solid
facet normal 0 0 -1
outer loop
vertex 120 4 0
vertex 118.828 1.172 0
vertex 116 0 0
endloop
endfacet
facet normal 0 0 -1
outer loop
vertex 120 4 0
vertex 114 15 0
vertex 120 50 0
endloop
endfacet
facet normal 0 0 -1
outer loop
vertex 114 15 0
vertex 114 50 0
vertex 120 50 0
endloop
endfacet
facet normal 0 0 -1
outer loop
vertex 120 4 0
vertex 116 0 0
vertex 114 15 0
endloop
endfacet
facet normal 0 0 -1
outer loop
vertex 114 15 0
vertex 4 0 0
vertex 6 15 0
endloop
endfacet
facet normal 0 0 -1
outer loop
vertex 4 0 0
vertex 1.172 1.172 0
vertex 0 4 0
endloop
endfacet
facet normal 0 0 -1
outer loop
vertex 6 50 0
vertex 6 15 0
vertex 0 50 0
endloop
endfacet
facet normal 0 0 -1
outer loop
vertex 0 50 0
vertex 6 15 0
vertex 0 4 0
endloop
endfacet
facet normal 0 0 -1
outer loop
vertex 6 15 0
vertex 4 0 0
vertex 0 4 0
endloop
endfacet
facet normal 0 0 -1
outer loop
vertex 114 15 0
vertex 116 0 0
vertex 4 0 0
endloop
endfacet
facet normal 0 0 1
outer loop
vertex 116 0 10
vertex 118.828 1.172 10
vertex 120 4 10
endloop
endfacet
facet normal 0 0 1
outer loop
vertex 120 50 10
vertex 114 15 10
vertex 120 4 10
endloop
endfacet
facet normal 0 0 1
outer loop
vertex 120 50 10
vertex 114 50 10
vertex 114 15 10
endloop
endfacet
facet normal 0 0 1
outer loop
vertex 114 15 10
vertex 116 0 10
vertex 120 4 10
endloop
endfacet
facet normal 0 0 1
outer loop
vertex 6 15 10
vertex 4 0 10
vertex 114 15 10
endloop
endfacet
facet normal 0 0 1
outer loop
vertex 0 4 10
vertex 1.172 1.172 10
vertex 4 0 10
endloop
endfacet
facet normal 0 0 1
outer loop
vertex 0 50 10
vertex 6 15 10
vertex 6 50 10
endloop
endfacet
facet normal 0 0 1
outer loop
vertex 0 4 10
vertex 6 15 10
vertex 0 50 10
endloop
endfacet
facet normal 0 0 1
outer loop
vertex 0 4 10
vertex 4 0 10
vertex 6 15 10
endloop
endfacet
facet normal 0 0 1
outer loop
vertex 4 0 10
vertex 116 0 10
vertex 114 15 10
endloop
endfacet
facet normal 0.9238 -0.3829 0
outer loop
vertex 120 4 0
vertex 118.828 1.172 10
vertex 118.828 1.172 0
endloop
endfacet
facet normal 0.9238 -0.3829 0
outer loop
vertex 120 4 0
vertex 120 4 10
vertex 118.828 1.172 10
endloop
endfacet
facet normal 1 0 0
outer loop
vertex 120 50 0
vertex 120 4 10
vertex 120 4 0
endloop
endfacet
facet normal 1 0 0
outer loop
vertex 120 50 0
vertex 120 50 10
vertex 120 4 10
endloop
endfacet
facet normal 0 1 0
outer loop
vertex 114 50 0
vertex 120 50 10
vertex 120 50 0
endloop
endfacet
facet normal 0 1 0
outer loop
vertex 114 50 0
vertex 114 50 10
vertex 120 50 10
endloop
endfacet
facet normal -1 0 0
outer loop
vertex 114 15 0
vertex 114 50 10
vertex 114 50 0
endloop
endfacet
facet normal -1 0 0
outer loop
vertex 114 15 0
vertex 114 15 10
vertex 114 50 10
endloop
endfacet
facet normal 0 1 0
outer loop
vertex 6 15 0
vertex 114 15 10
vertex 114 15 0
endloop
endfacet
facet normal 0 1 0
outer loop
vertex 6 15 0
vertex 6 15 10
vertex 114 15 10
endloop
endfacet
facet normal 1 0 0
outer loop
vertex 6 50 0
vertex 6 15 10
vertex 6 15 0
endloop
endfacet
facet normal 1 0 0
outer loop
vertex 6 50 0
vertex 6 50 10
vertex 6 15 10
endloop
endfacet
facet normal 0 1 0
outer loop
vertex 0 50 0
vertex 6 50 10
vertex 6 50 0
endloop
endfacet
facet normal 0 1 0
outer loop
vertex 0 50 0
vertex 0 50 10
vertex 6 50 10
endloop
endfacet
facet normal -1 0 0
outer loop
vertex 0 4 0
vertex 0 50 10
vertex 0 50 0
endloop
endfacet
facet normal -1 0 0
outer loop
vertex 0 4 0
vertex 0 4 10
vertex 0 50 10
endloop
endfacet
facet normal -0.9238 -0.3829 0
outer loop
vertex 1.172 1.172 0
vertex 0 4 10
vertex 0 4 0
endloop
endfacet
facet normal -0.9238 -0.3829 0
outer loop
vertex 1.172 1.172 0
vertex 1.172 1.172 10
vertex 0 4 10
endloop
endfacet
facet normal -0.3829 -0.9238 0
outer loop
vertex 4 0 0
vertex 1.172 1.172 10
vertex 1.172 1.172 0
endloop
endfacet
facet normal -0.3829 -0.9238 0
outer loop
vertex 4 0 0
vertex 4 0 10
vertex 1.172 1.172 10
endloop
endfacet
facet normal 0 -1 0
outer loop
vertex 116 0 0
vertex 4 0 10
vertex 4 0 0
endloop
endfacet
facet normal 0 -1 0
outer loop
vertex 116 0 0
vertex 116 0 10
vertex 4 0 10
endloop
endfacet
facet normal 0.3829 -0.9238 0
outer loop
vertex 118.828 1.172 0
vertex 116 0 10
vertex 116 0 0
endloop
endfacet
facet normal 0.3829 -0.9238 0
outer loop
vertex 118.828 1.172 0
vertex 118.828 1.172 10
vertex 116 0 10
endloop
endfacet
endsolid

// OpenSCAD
$fn = 32;

// ----------------------------------------------------------------------
// Heat sink frame: 120 x 50 mm frame, 6 mm walls
// ----------------------------------------------------------------------

// --- parameters (mm) ---
profile_height = 10;      // extrusion height
profile_points = 12;      // points of the closed outline

profile = [[0, 4], [1.172, 1.172], [4, 0], [116, 0], [118.828, 1.172], [120, 4], [120, 50], [114, 50], [114, 15], [6, 15], [6, 50], [0, 50]];  // single closed polygon, 12 points, counter clockwise

// --- the one profile operation ---
linear_extrude(height = profile_height) polygon(points = profile);
